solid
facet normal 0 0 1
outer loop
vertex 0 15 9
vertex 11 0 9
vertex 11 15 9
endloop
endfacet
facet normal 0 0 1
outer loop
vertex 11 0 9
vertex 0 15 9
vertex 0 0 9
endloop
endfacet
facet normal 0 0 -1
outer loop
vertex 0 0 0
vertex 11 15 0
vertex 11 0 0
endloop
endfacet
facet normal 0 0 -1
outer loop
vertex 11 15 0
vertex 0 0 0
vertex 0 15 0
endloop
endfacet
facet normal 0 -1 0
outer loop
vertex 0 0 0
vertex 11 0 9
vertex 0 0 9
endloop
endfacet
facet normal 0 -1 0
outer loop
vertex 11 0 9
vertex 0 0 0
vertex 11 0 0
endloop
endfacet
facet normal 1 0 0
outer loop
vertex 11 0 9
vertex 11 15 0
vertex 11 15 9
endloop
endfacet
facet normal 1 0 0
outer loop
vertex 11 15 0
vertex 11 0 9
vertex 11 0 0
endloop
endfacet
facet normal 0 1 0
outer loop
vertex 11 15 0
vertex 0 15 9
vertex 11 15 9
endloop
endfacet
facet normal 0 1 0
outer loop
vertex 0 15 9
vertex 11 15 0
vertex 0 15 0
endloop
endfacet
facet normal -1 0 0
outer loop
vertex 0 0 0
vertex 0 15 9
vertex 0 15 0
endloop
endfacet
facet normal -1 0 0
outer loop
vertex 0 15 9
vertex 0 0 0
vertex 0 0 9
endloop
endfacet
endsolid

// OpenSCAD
// Generated by SolidPython 1.0.1 on 2020-07-29 00:46:55


cube(size = [11, 15, 9]);
/***********************************************
*********      SolidPython code:      **********
************************************************
 
# import packages: SolidPython
from solid import *
from solid.utils import *
from itertools import chain, combinations, permutations


class Resize:

    def __init__(self, scad_file):
        self.scad_file = scad_file
        #self.scad_file = import_scad(scad_file)
        # cone/cylinder param:
        self.r1 = 0
        self.r2 = 0
        self.h = 0
        # rectangular prism param:
        self.w = 0
        self.l = 0
        # ellipse param:
        self.r = 0

    # import OpenScad code (file name corresponds to shape)


    # classify shape + parameters
    def assign(self, param1, param2, param3):
        if self.scad_file == 'cone.scad':
            self.r1 = param1
            self.r2 = param2
            self.h = param3
        elif self.scad_file == 'cylinder.scad':
            self.r1 = param1
            self.r2 = param2
            self.h = param3
        elif self.scad_file == 'rectangularPrism.scad':
            self.h = param1
            self.l = param2
            self.w = param3
        else:
            self.r = param1
            self.h = param2

    # resize parameters
    def iterate(self):
        x = range(3, 20, 2)
        i = 1
        if self.scad_file == 'cone.scad':
            tempList = list(permutations(x, 2))
            for temp in tempList:
                param1 = temp[0]
                param2 = temp[1]
                filepath = 'produced_scad_files/' + 'cone' + str(param1) + '_' + str(param2) + '_' + '.scad'
                scad_render_to_file(cylinder(h=param1, r1=param2, r2=0), filepath)

        elif self.scad_file == 'cylinder.scad':
            tempList = list(permutations(x, 3))
            for temp in tempList:
                param1 = temp[0]
                param2 = temp[1]
                filepath = 'produced_scad_files/' + 'cylinder' + str(param1) + '_' + str(param2) + '_' + '.scad'
                scad_render_to_file(cylinder(h=param1, r1=param2, r2=param2), filepath)

        elif self.scad_file == 'rectangularPrism.scad':
            tempList = list(permutations(x, 3))
            for temp in tempList:
                param1 = temp[0]
                param2 = temp[1]
                param3 = temp[2]
                filepath = 'produced_scad_files/' + 'rectangularPrism' + str(param1) + '_' + str(param2) + '_' + str(
                    param3) + '.scad'
                scad_render_to_file(cube(size=(param1, param2, param3)), filepath)

        elif self.scad_file == 'ellipse.scad':
            tempList = list(permutations(x, 4))
            for temp in tempList:
                param1 = temp[0]
                param2 = temp[1]
                param3 = temp[2]
                param4 = temp[3]
                filepath = 'produced_scad_files/' + 'ellipse' + str(param1) + '_' + str(param2) + '_' + str(param3) + '_' + str(param4) + '.scad'
                scad_render_to_file(scale([param1, param2, param3])(sphere(r=param4)), filepath)

    def render_to_scadfile(self):
        scad_render_to_file(scad, 'example.scad') 
 
************************************************/
